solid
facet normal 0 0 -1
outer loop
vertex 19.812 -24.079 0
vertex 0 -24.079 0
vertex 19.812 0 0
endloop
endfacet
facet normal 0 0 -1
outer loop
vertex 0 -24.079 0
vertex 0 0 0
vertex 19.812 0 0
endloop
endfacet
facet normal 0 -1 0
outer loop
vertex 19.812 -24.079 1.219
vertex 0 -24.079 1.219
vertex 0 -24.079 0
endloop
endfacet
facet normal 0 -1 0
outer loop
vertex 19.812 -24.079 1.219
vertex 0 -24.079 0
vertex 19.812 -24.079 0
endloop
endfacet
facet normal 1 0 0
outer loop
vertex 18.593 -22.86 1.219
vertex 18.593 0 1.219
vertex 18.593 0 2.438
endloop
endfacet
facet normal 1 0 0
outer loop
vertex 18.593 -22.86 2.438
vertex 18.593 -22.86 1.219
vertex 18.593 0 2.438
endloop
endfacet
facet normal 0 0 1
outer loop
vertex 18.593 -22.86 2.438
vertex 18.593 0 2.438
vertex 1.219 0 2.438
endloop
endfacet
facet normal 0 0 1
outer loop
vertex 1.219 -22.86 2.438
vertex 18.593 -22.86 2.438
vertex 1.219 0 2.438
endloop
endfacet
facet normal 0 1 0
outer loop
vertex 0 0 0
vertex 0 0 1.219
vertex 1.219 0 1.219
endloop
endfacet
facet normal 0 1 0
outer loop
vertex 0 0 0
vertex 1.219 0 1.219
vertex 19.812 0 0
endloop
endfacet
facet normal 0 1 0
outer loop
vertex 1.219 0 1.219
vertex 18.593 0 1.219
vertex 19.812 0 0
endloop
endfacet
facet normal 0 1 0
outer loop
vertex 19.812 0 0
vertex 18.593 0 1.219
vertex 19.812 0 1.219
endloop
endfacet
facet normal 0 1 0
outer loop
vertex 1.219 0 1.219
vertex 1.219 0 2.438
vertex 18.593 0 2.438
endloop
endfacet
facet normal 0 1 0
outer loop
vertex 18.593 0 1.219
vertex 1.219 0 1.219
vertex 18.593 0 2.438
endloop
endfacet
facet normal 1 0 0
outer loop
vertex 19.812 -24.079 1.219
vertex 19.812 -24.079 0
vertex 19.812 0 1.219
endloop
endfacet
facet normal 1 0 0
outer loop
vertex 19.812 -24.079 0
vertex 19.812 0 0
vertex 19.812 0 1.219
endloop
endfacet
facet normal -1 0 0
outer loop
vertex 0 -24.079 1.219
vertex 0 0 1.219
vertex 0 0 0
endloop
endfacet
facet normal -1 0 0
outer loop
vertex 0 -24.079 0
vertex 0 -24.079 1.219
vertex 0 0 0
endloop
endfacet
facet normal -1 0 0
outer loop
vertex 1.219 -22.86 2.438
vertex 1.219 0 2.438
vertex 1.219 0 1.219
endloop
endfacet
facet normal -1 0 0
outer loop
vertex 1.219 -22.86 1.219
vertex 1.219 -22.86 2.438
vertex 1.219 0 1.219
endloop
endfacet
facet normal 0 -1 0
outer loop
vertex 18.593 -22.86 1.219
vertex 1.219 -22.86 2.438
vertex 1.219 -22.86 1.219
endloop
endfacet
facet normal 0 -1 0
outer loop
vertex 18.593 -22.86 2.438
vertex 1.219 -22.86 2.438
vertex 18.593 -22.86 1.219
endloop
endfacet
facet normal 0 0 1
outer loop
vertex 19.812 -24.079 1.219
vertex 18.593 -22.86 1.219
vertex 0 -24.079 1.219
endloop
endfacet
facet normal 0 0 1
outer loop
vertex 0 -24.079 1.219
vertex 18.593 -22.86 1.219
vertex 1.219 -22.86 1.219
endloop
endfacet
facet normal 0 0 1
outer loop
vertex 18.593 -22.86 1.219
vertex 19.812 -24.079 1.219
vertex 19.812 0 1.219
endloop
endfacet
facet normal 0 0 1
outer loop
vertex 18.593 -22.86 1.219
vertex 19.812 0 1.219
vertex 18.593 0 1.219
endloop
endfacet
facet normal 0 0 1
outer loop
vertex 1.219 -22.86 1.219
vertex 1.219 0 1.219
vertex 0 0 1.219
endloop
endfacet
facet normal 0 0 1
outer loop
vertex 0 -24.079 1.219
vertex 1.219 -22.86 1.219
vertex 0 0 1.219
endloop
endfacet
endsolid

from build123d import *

# Parameters (mm, degrees)
F1_DEPTH = 22.86
F3_DEPTH = 1.2192


with BuildPart() as f1:
    # F0 (on Front) → F1 (new body)
    with BuildSketch(Plane.XZ):
        Polygon((0, 1.2192), (0, 0), (19.812, 0), (19.812, 1.2192), (18.5928, 1.2192), (18.5928, 2.4384), (1.2192, 2.4384), (1.2192, 1.2192), align=None)
    extrude(amount=F1_DEPTH)

    # F2 (on face) → F3 (join)
    with BuildSketch(Plane.XZ.offset(22.86)):
        Polygon((0, 1.2192), (0, 0), (19.812, 0), (19.812, 1.2192), (18.5928, 1.2192), (1.2192, 1.2192), align=None)
    extrude(amount=F3_DEPTH)


solid = f1.part
